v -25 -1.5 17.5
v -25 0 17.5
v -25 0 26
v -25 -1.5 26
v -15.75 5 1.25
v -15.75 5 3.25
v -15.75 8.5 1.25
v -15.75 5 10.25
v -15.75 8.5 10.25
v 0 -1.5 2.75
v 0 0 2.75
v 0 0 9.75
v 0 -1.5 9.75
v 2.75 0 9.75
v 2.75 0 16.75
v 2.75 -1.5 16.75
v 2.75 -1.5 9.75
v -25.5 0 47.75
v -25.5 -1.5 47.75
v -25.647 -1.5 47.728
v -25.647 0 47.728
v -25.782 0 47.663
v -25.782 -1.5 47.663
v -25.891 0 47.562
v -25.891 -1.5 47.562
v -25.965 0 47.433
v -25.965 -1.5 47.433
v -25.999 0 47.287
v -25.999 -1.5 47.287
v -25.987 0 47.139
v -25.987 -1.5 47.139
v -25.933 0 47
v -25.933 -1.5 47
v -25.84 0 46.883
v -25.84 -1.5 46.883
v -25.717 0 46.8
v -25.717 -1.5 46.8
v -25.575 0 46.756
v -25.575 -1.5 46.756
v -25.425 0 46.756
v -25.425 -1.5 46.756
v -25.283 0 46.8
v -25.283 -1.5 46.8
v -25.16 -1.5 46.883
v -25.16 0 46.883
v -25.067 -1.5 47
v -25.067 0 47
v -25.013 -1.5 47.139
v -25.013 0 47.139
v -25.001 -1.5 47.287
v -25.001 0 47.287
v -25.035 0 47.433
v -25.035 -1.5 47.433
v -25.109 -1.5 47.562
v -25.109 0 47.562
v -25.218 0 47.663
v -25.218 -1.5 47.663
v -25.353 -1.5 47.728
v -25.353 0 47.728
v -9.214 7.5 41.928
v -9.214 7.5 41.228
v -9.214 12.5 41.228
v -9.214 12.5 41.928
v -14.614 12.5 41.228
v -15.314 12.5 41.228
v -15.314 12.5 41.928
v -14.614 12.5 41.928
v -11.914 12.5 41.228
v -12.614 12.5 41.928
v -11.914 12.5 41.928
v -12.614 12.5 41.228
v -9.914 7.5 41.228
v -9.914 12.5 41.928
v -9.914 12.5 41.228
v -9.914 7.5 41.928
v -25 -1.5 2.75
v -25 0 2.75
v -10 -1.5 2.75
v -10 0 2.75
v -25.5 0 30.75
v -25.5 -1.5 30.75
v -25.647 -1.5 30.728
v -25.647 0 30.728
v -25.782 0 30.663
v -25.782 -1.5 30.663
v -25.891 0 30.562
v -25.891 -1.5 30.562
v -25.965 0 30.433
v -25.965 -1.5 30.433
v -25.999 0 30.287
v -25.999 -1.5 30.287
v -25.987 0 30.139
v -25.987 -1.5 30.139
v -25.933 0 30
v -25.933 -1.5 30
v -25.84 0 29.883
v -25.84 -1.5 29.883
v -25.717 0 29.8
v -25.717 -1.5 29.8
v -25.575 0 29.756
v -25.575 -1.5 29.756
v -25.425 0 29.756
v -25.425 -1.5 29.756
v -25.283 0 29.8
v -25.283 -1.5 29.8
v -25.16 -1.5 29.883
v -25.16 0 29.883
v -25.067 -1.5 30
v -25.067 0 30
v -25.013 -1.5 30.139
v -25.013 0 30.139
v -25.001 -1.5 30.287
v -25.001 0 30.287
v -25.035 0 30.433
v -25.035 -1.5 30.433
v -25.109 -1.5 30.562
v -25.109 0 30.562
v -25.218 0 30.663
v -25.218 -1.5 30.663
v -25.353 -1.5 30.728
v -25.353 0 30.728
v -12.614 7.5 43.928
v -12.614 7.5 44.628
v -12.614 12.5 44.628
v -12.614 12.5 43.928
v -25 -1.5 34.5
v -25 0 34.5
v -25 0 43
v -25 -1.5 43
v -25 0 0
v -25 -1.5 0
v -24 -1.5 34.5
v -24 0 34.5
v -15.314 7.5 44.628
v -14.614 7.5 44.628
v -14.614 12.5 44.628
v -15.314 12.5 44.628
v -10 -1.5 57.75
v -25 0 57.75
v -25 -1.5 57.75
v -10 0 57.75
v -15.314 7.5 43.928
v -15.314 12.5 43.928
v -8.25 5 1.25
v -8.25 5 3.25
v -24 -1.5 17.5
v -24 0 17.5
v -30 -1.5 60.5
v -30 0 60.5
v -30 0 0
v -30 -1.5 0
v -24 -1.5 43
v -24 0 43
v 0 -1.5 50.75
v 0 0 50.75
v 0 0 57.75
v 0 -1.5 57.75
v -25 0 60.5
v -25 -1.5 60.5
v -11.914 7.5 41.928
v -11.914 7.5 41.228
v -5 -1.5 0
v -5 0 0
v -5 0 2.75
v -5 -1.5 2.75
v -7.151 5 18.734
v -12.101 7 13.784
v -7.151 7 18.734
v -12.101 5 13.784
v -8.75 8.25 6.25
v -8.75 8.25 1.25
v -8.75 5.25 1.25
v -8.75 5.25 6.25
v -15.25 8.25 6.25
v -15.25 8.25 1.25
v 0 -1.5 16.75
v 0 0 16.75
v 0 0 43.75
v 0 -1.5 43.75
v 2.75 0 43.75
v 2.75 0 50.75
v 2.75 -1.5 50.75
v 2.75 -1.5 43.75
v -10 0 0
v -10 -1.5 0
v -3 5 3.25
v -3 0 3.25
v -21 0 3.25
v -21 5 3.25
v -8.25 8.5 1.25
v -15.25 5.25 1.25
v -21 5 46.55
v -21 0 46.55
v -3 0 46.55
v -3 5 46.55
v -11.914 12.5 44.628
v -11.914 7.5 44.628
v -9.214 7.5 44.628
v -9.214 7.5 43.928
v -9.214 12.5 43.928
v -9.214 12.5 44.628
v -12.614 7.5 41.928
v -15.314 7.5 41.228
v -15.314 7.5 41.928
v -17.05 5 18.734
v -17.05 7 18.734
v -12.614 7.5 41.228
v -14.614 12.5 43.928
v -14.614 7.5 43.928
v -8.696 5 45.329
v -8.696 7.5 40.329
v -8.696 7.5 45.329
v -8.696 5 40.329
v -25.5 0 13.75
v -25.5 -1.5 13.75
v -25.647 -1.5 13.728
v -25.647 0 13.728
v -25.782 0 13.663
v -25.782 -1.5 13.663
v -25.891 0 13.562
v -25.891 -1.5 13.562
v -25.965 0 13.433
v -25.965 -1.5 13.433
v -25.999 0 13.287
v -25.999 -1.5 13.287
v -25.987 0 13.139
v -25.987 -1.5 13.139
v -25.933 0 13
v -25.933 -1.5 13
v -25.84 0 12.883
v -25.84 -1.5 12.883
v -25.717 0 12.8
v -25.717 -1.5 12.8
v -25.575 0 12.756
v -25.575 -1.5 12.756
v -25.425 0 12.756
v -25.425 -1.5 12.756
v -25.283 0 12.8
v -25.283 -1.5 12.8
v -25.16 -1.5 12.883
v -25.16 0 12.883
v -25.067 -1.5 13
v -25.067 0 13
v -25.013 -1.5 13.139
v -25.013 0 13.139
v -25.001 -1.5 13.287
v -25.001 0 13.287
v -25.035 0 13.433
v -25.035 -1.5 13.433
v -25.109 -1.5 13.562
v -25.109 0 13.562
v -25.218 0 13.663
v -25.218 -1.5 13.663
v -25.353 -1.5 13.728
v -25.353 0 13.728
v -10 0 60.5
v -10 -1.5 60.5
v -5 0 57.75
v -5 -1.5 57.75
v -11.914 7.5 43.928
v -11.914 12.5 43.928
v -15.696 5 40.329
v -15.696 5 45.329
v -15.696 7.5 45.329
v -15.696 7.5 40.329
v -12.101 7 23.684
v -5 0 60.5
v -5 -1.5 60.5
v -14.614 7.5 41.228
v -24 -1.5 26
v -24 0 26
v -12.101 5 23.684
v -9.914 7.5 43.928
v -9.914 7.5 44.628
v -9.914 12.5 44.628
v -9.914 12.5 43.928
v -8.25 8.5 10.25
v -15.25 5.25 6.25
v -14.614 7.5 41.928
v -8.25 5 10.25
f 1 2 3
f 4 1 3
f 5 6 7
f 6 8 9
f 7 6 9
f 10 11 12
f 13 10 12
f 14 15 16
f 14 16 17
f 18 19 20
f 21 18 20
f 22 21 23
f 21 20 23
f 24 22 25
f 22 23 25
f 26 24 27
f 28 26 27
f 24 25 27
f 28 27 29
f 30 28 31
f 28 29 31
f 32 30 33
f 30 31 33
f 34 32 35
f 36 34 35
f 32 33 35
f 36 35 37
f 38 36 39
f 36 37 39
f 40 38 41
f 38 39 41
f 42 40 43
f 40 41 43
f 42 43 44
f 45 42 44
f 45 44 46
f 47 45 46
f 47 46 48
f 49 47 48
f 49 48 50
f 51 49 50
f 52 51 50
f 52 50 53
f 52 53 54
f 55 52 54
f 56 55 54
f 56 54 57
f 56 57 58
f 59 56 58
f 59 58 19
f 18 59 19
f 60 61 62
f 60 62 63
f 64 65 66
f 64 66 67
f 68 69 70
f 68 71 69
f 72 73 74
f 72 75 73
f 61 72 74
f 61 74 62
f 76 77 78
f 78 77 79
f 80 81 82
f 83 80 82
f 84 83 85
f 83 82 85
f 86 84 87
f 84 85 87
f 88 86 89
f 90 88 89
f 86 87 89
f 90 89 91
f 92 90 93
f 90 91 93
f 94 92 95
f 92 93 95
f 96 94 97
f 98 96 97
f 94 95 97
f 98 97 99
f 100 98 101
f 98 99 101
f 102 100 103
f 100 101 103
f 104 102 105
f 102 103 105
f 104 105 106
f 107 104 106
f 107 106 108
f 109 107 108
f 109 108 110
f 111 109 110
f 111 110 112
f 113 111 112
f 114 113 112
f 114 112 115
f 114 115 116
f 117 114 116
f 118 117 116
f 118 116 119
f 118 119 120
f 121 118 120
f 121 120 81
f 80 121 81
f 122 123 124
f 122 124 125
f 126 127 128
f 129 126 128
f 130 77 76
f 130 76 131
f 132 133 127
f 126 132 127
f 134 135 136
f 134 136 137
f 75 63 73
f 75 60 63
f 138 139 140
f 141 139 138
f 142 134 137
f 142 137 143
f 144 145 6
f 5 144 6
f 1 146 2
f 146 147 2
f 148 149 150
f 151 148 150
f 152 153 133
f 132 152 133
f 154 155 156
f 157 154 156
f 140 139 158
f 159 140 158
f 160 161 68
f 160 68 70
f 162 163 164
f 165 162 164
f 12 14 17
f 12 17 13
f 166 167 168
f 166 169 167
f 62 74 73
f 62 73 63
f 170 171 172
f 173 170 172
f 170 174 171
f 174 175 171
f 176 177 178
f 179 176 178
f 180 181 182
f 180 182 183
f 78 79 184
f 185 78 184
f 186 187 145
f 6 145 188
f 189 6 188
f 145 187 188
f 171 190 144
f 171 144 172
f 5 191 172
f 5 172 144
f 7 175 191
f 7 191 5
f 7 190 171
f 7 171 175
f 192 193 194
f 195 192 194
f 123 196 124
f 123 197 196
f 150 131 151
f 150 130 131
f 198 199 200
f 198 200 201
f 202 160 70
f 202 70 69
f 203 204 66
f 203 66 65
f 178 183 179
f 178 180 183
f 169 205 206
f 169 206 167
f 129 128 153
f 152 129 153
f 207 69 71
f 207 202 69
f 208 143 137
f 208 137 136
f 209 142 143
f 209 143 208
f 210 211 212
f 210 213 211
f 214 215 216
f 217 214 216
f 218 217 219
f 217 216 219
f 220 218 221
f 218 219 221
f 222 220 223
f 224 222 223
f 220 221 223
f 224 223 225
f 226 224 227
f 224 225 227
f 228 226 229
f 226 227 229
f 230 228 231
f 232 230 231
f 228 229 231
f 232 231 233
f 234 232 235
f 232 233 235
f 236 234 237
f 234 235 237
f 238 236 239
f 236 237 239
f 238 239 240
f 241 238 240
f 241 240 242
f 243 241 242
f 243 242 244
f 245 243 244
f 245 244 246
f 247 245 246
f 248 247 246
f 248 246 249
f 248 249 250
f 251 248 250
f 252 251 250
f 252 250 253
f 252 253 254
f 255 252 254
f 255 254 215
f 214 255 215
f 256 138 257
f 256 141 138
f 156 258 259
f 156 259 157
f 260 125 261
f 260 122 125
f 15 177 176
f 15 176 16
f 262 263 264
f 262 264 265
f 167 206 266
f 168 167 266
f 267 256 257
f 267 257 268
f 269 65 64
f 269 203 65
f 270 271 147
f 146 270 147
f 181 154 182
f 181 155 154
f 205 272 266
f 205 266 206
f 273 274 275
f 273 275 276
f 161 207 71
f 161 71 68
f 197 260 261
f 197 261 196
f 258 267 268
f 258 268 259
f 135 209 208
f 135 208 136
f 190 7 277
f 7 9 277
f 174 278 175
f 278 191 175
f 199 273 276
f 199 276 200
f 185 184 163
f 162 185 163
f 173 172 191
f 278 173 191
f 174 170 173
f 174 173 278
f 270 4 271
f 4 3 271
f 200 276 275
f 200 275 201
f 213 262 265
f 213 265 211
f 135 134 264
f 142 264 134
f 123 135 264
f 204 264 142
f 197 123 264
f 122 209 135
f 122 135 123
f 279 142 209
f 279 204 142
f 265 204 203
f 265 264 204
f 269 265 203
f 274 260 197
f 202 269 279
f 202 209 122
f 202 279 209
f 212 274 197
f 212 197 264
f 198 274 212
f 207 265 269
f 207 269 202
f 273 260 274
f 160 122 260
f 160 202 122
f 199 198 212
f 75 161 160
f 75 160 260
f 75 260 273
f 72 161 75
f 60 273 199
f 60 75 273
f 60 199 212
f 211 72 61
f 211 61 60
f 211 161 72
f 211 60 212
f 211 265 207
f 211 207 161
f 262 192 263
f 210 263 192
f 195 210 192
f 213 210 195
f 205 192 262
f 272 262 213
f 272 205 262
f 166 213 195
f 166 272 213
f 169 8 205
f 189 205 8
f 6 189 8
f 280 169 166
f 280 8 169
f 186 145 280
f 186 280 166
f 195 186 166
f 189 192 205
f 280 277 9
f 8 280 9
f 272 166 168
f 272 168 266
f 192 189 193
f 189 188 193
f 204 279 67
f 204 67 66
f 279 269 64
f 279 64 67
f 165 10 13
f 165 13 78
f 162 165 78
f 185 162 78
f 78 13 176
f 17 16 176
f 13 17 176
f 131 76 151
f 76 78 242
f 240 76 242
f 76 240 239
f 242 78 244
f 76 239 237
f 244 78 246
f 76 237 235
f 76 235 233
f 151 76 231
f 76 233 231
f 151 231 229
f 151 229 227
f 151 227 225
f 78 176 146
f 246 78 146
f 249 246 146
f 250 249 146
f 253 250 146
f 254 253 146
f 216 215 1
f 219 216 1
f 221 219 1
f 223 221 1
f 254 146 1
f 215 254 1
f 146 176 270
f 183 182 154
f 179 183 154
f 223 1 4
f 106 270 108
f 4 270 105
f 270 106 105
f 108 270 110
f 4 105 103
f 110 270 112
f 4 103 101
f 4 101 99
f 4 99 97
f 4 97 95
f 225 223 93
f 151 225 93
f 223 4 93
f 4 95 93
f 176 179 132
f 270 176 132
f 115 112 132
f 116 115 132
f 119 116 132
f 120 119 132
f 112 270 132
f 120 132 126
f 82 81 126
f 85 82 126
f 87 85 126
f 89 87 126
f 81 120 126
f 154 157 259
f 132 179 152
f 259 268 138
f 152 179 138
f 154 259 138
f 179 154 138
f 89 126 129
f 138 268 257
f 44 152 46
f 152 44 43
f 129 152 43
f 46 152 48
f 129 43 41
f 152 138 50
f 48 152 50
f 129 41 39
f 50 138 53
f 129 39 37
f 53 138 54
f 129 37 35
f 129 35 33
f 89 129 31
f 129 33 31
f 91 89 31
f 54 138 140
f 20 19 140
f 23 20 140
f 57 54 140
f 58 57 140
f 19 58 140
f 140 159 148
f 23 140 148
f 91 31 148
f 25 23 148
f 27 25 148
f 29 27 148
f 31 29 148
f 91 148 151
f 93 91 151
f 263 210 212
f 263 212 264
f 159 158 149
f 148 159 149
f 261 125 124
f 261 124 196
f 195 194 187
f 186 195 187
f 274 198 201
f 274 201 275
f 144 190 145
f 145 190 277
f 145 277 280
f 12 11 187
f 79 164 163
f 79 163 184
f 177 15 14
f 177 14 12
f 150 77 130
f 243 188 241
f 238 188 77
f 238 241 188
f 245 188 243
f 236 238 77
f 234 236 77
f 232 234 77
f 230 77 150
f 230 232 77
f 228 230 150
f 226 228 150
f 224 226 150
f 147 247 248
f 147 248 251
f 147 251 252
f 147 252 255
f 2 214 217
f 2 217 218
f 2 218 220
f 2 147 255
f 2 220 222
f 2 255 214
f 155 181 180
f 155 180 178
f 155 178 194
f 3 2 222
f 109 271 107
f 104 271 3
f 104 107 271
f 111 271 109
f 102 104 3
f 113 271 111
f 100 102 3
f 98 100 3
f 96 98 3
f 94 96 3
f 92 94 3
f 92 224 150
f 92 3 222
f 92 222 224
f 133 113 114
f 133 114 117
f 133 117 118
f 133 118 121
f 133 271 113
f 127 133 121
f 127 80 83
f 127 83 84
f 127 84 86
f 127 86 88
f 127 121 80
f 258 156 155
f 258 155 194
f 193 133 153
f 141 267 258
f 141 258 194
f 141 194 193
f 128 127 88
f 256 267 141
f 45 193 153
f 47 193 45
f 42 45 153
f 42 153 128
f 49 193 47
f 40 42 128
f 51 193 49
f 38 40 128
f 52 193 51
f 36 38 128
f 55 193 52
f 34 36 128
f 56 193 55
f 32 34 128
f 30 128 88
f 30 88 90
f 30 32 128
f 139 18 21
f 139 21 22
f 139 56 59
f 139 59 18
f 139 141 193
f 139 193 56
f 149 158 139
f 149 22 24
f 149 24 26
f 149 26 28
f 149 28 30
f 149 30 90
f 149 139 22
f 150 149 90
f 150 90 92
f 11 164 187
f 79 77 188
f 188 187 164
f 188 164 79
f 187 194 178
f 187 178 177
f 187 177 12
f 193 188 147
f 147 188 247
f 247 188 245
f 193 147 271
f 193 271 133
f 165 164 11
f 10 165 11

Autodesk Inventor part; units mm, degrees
ref_plane "YZ Plane" through (0, 0, 0) normal (1, 0, 0) x (0, 1, 0)
ref_plane "XZ Plane" through (0, 0, 0) normal (0, 1, 0) x (-1, 0, 0)
ref_plane "XY Plane" through (0, 0, 0) normal (0, 0, 1) x (1, 0, 0)
sketch "Sketch1" plane through (0, 0, 0) normal (0, 1, 0) x (-1, 0, 0)
  line L0 (15, 17.8107) -> (15, 41.4147) construction
  line L1 (30, 60.5) -> (30, 0)
  line L2 (25, 17.5) -> (25, 26)
  line L3 (25, 26) -> (24, 26)
  line L4 (24, 26) -> (24, 17.5)
  line L5 (24, 17.5) -> (25, 17.5)
  line L6 (24, 34.5) -> (25, 34.5)
  line L7 (25, 34.5) -> (25, 43)
  line L8 (25, 43) -> (24, 43)
  line L9 (24, 43) -> (24, 34.5)
  line L10 (25, 57.75) -> (25, 60.5)
  line L11 (25, 60.5) -> (30, 60.5)
  line L12 (10, 57.75) -> (10, 60.5)
  line L13 (25, 57.75) -> (10, 57.75)
  line L14 (25, 2.75) -> (25, 0)
  line L15 (25, 0) -> (30, 0)
  line L16 (10, 2.75) -> (10, 0)
  line L17 (25, 2.75) -> (10, 2.75)
  line L18 (0, 50.75) -> (-2.75, 50.75)
  line L19 (-2.75, 50.75) -> (-2.75, 43.75)
  line L20 (-2.75, 43.75) -> (0, 43.75)
  line L21 (0, 16.75) -> (-2.75, 16.75)
  line L22 (-2.75, 16.75) -> (-2.75, 9.75)
  line L23 (-2.75, 9.75) -> (0, 9.75)
  line L24 (17.3275, 30.25) -> (11.5049, 30.25) construction
  line L25 (0, 50.75) -> (0, 57.75)
  line L26 (0, 2.75) -> (0, 9.75)
  line L27 (0, 16.75) -> (0, 43.75)
  line L28 (10, 0) -> (5, 0)
  line L29 (5, 0) -> (5, 2.75)
  line L30 (5, 2.75) -> (0, 2.75)
  line L31 (10, 60.5) -> (5, 60.5)
  line L32 (5, 60.5) -> (5, 57.75)
  line L33 (5, 57.75) -> (0, 57.75)
  point P0 (0, 0)
  point P1 (0, 0)
  point P2 (0, 0)
  point P3 (0, 0)
  point P4 (0, 0)
  point P5 (25.5, 47.25)
  point P6 (25.5, 30.25)
  point P7 (25.5, 13.25)
  dimension "d151" = 8.5
  dimension "d153" = 1
  dimension "d155" = 5
  dimension "d159" = 17
  dimension "d160" = 17
  dimension "d161" = 4.25
  dimension "d162" = 4.25
  dimension "d176" = 4.5
  dimension "d177" = 5
  dimension "d179" = 55
  dimension "d180" = 2.75
  dimension "d182" = 7
  dimension "d183" = 7
  dimension "d184" = 30
extrude "Extrusion1" add sketch "Sketch1" against normal blind 1.5
hole "Hole1" at (-25.5, 0, 47.25) at (-25.5, 0, 30.25) at (-25.5, 0, 13.25) direction (0, -1, 0) diameter 1 end through all
sketch "Sketch4" plane through (0, 0, 0) normal (0, 1, 0) x (1, 0, 0)
  line L0 (-3, -46.55) -> (-3, -3.25)
  line L1 (-3, -3.25) -> (-21, -3.25)
  line L2 (-21, -3.25) -> (-21, -46.55)
  line L3 (-21, -46.55) -> (-3, -46.55)
  line L4 (-25, -2.75) -> (-10, -2.75) projected
  line L5 (-10, -2.75) -> (-25, -2.75) projected
  line L6 (0, -43.75) -> (0, -16.75) projected
  point P0 (0, 0)
  dimension "d188" = 43.3
  dimension "d189" = 18
  dimension "d190" = 3
  dimension "d212" = 0.5
extrude "Extrusion11" add sketch "Sketch4" along normal blind 5
sketch "Sketch6" plane through (0, 5, 0) normal (0, 1, 0) x (1, 0, 0)
  line L0 (-17.0504, -18.7342) -> (-12.1007, -13.7844)
  line L1 (-12.1007, -13.7844) -> (-7.1509, -18.7342)
  line L2 (-7.1509, -18.7342) -> (-12.1007, -23.6839)
  line L3 (-12.1007, -23.6839) -> (-17.0504, -18.7342)
  point P0 (0, 0)
  dimension "d198" = 7
  dimension "d199" = 7
extrude "Extrusion13" add sketch "Sketch6" along normal blind 2
sketch "Sketch7" plane through (0, 5, 0) normal (0, 1, 0) x (1, 0, 0)
  line L0 (-15.6959, -40.3292) -> (-8.6959, -40.3292)
  line L1 (-8.6959, -40.3292) -> (-8.6959, -45.3292)
  line L2 (-8.6959, -45.3292) -> (-15.6959, -45.3292)
  line L3 (-15.6959, -45.3292) -> (-15.6959, -40.3292)
  point P0 (0, 0)
  dimension "d202" = 7
  dimension "d203" = 5
extrude "Extrusion14" add sketch "Sketch7" along normal blind 2.5
sketch "Sketch8" plane through (0, 7.5, 0) normal (0, 1, 0) x (1, 0, 0)
  line L0 (-15.3142, -41.2282) -> (-14.6142, -41.2282)
  line L1 (-14.6142, -41.2282) -> (-14.6142, -41.9282)
  line L2 (-14.6142, -41.9282) -> (-15.3142, -41.9282)
  line L3 (-15.3142, -41.9282) -> (-15.3142, -41.2282)
  line L4 (-15.3142, -43.9282) -> (-14.6142, -43.9282)
  line L5 (-14.6142, -43.9282) -> (-14.6142, -44.6282)
  line L6 (-14.6142, -44.6282) -> (-15.3142, -44.6282)
  line L7 (-15.3142, -44.6282) -> (-15.3142, -43.9282)
  line L8 (-12.6142, -41.2282) -> (-11.9142, -41.2282)
  line L9 (-11.9142, -41.2282) -> (-11.9142, -41.9282)
  line L10 (-11.9142, -41.9282) -> (-12.6142, -41.9282)
  line L11 (-12.6142, -41.9282) -> (-12.6142, -41.2282)
  line L12 (-12.6142, -43.9282) -> (-11.9142, -43.9282)
  line L13 (-11.9142, -43.9282) -> (-11.9142, -44.6282)
  line L14 (-11.9142, -44.6282) -> (-12.6142, -44.6282)
  line L15 (-12.6142, -44.6282) -> (-12.6142, -43.9282)
  line L16 (-9.9142, -41.2282) -> (-9.2142, -41.2282)
  line L17 (-9.2142, -41.2282) -> (-9.2142, -41.9282)
  line L18 (-9.2142, -41.9282) -> (-9.9142, -41.9282)
  line L19 (-9.9142, -41.9282) -> (-9.9142, -41.2282)
  line L20 (-9.9142, -43.9282) -> (-9.2142, -43.9282)
  line L21 (-9.2142, -43.9282) -> (-9.2142, -44.6282)
  line L22 (-9.2142, -44.6282) -> (-9.9142, -44.6282)
  line L23 (-9.9142, -44.6282) -> (-9.9142, -43.9282)
  point P0 (0, 0)
  dimension "d206" = 0.7
  dimension "d207" = 2
  dimension "d208" = 2
  dimension "d209" = 2
extrude "Extrusion15" add sketch "Sketch8" along normal blind 5
sketch "Sketch9" plane through (-3, 0, 3.25) normal (0, 0, -1) x (-1, 0, 0)
  line L0 (12.75, 8.5) -> (5.25, 8.5)
  line L1 (5.25, 8.5) -> (5.25, 5)
  line L2 (5.25, 5) -> (12.75, 5)
  line L3 (12.75, 5) -> (12.75, 8.5)
  line L4 (9, 5.7242) -> (9, 7.4058) construction
  line L5 (18, 0) -> (18, 5) projected
  line L6 (0, 5) -> (18, 5) projected
  point P0 (-3, 0)
  dimension "d213" = 7.5
  dimension "d214" = 3.5
  dimension "d215" = 9
extrude "Extrusion16" add sketch "Sketch9" along normal blind 2 and the other way blind 7
sketch "Sketch15" plane through (-3, 0, 1.25) normal (0, 0, -1) x (-1, 0, 0)
  line L0 (12.25, 8.25) -> (5.75, 8.25)
  line L1 (5.75, 8.25) -> (5.75, 5.25)
  line L2 (5.75, 5.25) -> (12.25, 5.25)
  line L3 (12.25, 5.25) -> (12.25, 8.25)
  line L4 (5.25, 8.5) -> (5.25, 5) projected
  line L5 (12.75, 8.5) -> (5.25, 8.5) projected
  point P0 (-3, 0)
  dimension "d242" = 6.5
  dimension "d243" = 3
  dimension "d244" = 0.5
  dimension "d245" = 0.25
extrude "Extrusion20" cut sketch "Sketch15" against normal blind 5
properties part number "Motherboard_dummy" material "ABS Plastic"
